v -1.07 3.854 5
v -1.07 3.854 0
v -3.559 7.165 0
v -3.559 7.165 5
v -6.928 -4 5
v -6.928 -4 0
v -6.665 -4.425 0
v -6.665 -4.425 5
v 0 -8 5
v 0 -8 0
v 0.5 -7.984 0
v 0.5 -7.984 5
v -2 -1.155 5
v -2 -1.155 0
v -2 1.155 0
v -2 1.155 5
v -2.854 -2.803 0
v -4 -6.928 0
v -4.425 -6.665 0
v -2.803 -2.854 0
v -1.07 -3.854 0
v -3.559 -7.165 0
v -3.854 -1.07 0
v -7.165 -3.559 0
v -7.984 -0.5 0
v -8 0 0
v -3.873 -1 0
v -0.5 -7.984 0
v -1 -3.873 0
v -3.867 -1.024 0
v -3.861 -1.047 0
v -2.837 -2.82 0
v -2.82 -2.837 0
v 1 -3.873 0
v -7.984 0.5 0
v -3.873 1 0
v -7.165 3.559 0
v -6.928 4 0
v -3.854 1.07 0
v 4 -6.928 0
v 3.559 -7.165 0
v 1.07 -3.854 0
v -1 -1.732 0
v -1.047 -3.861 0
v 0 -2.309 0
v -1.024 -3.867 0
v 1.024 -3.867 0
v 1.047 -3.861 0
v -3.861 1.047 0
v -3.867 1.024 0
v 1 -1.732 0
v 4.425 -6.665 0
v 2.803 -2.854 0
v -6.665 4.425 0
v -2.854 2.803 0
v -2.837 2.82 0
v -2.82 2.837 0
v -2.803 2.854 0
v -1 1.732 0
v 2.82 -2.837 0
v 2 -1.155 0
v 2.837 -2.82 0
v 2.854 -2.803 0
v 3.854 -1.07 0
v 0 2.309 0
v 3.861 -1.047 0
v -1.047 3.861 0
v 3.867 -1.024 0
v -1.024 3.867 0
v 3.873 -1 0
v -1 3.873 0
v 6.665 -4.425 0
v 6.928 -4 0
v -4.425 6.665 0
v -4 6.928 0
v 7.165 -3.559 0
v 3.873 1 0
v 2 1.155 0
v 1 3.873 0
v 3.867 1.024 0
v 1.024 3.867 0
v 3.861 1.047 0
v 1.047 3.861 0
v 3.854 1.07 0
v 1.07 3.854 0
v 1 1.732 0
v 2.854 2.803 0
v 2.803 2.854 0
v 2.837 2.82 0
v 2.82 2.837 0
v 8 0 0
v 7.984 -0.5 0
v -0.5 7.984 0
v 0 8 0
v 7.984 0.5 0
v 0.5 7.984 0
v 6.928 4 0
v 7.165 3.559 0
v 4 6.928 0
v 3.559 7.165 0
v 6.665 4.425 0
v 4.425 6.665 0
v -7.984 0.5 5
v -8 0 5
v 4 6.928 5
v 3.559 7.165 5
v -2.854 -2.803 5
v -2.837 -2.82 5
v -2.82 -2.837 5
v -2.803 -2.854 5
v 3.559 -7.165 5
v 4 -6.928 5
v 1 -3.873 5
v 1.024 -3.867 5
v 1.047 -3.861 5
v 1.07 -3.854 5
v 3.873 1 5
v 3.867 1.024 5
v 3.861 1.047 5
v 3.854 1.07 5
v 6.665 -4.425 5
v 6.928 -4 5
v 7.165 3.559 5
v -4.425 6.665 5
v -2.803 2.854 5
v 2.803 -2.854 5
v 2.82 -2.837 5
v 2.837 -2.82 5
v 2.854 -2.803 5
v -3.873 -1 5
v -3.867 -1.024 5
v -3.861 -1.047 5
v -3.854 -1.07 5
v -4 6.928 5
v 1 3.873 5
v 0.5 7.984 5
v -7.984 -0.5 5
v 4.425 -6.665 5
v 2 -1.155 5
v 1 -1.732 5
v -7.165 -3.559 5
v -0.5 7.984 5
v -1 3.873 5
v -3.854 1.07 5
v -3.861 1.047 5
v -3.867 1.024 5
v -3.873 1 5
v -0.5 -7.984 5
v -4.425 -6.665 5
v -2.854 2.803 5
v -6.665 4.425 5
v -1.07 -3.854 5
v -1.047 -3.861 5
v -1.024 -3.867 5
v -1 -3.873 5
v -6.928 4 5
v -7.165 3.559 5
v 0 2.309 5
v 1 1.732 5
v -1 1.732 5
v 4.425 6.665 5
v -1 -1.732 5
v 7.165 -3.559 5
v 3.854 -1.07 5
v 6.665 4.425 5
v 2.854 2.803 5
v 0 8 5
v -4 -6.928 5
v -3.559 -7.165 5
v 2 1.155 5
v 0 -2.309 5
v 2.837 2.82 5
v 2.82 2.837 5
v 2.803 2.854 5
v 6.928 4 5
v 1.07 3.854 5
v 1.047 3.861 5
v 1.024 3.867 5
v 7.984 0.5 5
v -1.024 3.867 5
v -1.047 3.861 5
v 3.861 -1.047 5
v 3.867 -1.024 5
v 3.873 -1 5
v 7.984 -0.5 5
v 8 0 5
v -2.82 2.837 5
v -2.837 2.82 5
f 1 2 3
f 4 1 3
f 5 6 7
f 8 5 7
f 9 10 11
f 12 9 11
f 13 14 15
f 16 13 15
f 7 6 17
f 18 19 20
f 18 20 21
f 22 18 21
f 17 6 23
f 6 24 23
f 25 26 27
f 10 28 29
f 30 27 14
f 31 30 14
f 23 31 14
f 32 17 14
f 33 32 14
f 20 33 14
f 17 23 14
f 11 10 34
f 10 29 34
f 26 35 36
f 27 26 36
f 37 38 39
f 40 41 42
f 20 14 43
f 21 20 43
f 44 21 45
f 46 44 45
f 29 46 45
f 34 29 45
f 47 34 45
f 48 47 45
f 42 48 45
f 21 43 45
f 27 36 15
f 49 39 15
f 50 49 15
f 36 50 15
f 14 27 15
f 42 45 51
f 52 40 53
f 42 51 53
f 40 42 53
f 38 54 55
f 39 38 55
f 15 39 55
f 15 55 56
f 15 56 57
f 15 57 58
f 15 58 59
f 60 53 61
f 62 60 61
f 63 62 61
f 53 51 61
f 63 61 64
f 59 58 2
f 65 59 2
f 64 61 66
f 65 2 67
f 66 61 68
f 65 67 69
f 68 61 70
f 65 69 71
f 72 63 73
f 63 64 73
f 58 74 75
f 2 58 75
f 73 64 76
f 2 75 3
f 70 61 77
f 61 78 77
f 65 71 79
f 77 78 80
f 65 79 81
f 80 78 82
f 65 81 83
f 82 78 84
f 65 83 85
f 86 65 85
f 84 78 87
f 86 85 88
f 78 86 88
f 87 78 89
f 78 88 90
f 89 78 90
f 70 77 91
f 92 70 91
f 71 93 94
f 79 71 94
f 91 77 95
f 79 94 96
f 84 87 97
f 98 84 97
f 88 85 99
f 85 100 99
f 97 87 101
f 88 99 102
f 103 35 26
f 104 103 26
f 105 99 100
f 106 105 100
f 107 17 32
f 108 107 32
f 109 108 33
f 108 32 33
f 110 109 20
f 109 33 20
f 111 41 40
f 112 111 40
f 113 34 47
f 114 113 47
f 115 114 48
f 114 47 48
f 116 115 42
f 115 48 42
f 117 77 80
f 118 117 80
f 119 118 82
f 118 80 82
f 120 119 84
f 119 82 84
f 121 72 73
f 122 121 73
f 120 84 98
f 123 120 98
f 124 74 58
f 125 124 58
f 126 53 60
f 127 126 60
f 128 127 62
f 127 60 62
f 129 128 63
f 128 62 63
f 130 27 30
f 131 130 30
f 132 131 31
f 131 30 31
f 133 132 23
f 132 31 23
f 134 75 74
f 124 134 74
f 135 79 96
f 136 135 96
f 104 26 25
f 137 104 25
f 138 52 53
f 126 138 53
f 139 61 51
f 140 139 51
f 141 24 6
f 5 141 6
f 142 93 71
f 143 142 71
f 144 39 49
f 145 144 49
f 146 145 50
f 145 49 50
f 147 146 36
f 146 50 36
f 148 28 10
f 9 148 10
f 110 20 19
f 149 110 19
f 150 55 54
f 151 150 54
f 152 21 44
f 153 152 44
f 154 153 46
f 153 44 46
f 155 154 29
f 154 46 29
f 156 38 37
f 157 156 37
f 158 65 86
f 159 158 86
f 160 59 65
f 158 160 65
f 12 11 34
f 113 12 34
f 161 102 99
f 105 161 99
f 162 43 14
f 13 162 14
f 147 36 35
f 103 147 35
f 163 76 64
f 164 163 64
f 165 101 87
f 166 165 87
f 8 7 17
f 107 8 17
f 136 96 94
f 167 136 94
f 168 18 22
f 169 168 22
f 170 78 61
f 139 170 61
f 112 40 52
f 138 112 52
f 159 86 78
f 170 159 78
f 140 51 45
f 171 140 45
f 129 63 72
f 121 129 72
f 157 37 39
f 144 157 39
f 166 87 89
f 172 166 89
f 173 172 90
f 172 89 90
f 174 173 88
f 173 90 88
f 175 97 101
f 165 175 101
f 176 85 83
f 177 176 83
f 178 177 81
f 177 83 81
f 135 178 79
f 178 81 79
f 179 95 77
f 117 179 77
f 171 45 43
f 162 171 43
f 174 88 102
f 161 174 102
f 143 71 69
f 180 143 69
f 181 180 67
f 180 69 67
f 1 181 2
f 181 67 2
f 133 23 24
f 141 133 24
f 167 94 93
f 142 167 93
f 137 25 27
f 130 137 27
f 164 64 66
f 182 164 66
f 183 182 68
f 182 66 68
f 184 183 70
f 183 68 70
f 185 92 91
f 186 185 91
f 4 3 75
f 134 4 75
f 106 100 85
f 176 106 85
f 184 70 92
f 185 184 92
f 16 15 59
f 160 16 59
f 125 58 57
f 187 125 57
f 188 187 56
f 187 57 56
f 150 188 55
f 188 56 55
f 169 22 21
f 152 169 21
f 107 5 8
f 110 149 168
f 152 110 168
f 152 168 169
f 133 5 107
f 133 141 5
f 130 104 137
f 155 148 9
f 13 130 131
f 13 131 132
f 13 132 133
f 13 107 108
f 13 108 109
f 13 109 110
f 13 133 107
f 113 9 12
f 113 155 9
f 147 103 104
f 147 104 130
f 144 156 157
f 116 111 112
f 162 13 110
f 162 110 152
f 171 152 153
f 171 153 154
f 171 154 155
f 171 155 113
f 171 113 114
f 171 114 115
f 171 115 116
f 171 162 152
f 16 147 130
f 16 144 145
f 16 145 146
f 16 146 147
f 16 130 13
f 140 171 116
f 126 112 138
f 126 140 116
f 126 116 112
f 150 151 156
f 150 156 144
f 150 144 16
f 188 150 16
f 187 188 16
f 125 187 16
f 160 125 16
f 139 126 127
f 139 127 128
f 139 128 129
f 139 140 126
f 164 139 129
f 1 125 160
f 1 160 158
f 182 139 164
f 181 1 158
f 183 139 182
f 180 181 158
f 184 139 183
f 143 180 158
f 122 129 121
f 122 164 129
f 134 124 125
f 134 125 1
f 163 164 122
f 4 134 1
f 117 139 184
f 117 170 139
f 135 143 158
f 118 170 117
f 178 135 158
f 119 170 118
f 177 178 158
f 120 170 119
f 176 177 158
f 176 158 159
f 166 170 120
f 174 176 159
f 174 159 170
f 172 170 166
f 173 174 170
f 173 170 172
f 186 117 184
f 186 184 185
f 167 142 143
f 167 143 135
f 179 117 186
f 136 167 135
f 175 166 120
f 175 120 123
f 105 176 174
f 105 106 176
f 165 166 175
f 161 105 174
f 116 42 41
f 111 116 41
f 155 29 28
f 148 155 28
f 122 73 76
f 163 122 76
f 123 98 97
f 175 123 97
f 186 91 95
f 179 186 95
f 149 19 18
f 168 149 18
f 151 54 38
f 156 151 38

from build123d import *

# Parameters (mm, degrees)
F1_DEPTH = 5


# Not quite as in the source:
# - a feature names something its author has since deleted; it is built from what else it names


with BuildPart() as f1:
    # F0 (on Top) → F1 (new body)
    with BuildSketch(Plane.XY):
        with BuildLine():
            ThreePointArc((-1, 3.8729833462), (0, 4), (1, 3.8729833462))
            Line((1, 3.8729833462), (0.4997557997, 7.984375))
            Line((0.4997557997, 7.984375), (0, 8))
            Line((0, 8), (-0.4997557997, 7.984375))
            Line((-0.4997557997, 7.984375), (-1, 3.8729833462))
        make_face()
        with BuildLine():
            ThreePointArc((4, 0), (3.9681187851, 0.5040171699), (3.8729833462, 1))
            ThreePointArc((3.8729833462, 1), (3.8637033052, 1.0352761804), (3.8541019662, 1.0704662693))
            ThreePointArc((3.8541019662, 1.0704662693), (3.4641016151, 2), (2.8541019662, 2.8025170769))
            ThreePointArc((2.8541019662, 2.8025170769), (2.8284271247, 2.8284271247), (2.8025170769, 2.8541019662))
            ThreePointArc((2.8025170769, 2.8541019662), (2, 3.4641016151), (1.0704662693, 3.8541019662))
            ThreePointArc((1.0704662693, 3.8541019662), (1.0352761804, 3.8637033052), (1, 3.8729833462))
            ThreePointArc((1, 3.8729833462), (0, 4), (-1, 3.8729833462))
            ThreePointArc((-1, 3.8729833462), (-1.0352761804, 3.8637033052), (-1.0704662693, 3.8541019662))
            ThreePointArc((-1.0704662693, 3.8541019662), (-2, 3.4641016151), (-2.8025170769, 2.8541019662))
            ThreePointArc((-2.8025170769, 2.8541019662), (-2.8284271247, 2.8284271247), (-2.8541019662, 2.8025170769))
            ThreePointArc((-2.8541019662, 2.8025170769), (-3.4641016151, 2), (-3.8541019662, 1.0704662693))
            ThreePointArc((-3.8541019662, 1.0704662693), (-3.8637033052, 1.0352761804), (-3.8729833462, 1))
            ThreePointArc((-3.8729833462, 1), (-4, 0), (-3.8729833462, -1))
            ThreePointArc((-3.8729833462, -1), (-3.8637033052, -1.0352761804), (-3.8541019662, -1.0704662693))
            ThreePointArc((-3.8541019662, -1.0704662693), (-3.4641016151, -2), (-2.8541019662, -2.8025170769))
            ThreePointArc((-2.8541019662, -2.8025170769), (-2.8284271247, -2.8284271247), (-2.8025170769, -2.8541019662))
            ThreePointArc((-2.8025170769, -2.8541019662), (-2, -3.4641016151), (-1.0704662693, -3.8541019662))
            ThreePointArc((-1.0704662693, -3.8541019662), (-1.0352761804, -3.8637033052), (-1, -3.8729833462))
            ThreePointArc((-1, -3.8729833462), (0, -4), (1, -3.8729833462))
            ThreePointArc((1, -3.8729833462), (1.0352761804, -3.8637033052), (1.0704662693, -3.8541019662))
            ThreePointArc((1.0704662693, -3.8541019662), (2, -3.4641016151), (2.8025170769, -2.8541019662))
            ThreePointArc((2.8025170769, -2.8541019662), (2.8284271247, -2.8284271247), (2.8541019662, -2.8025170769))
            ThreePointArc((2.8541019662, -2.8025170769), (3.4641016151, -2), (3.8541019662, -1.0704662693))
            ThreePointArc((3.8541019662, -1.0704662693), (3.8637033052, -1.0352761804), (3.8729833462, -1))
            ThreePointArc((3.8729833462, -1), (3.9681187851, -0.5040171699), (4, 0))
        make_face()
        Polygon((2, 1.1547005384), (2, 0), (2, -1.1547005384), (1.0000000433, -1.7320507826), (0, -2.3094010768), (-1.0000000161, -1.7320507983), (-2, -1.1547005384), (-2, 0), (-2, 1.1547005384), (-1.0000000433, 1.7320507826), (0, 2.3094010768), (0.9999999889, 1.732050814), align=None, mode=Mode.SUBTRACT)
        with BuildLine():
            Line((2.8025170769, 2.8541019662), (4.4249887183, 6.6647936835))
            Line((4.4249887183, 6.6647936835), (4, 6.9282032303))
            Line((4, 6.9282032303), (3.5593862817, 7.1645494832))
            Line((3.5593862817, 7.1645494832), (1.0704662693, 3.8541019662))
            ThreePointArc((1.0704662693, 3.8541019662), (2, 3.4641016151), (2.8025170769, 2.8541019662))
        make_face()
        with BuildLine():
            Line((3.8541019662, 1.0704662693), (7.1645494832, 3.5593862817))
            Line((7.1645494832, 3.5593862817), (6.9282032303, 4))
            Line((6.9282032303, 4), (6.6647936835, 4.4249887183))
            Line((6.6647936835, 4.4249887183), (2.8541019662, 2.8025170769))
            ThreePointArc((2.8541019662, 2.8025170769), (3.4641016151, 2), (3.8541019662, 1.0704662693))
        make_face()
        with BuildLine():
            Line((7.984375, -0.4997557997), (8, 0))
            Line((8, 0), (7.984375, 0.4997557997))
            Line((7.984375, 0.4997557997), (3.8729833462, 1))
            ThreePointArc((3.8729833462, 1), (3.9681187851, 0.5040171699), (4, 0))
            ThreePointArc((4, 0), (3.9681187851, -0.5040171699), (3.8729833462, -1))
            Line((3.8729833462, -1), (7.984375, -0.4997557997))
        make_face()
        with BuildLine():
            Line((6.9282032303, -4), (7.1645494832, -3.5593862817))
            Line((7.1645494832, -3.5593862817), (3.8541019662, -1.0704662693))
            ThreePointArc((3.8541019662, -1.0704662693), (3.4641016151, -2), (2.8541019662, -2.8025170769))
            Line((2.8541019662, -2.8025170769), (6.6647936835, -4.4249887183))
            Line((6.6647936835, -4.4249887183), (6.9282032303, -4))
        make_face()
        with BuildLine():
            Line((4, -6.9282032303), (4.4249887183, -6.6647936835))
            Line((4.4249887183, -6.6647936835), (2.8025170769, -2.8541019662))
            ThreePointArc((2.8025170769, -2.8541019662), (2, -3.4641016151), (1.0704662693, -3.8541019662))
            Line((1.0704662693, -3.8541019662), (3.5593862817, -7.1645494832))
            Line((3.5593862817, -7.1645494832), (4, -6.9282032303))
        make_face()
        with BuildLine():
            Line((0.4997557997, -7.984375), (1, -3.8729833462))
            ThreePointArc((1, -3.8729833462), (0, -4), (-1, -3.8729833462))
            Line((-1, -3.8729833462), (-0.4997557997, -7.984375))
            Line((-0.4997557997, -7.984375), (0, -8))
            Line((0, -8), (0.4997557997, -7.984375))
        make_face()
        with BuildLine():
            Line((-3.5593862817, -7.1645494832), (-1.0704662693, -3.8541019662))
            ThreePointArc((-1.0704662693, -3.8541019662), (-2, -3.4641016151), (-2.8025170769, -2.8541019662))
            Line((-2.8025170769, -2.8541019662), (-4.4249887183, -6.6647936835))
            Line((-4.4249887183, -6.6647936835), (-4, -6.9282032303))
            Line((-4, -6.9282032303), (-3.5593862817, -7.1645494832))
        make_face()
        with BuildLine():
            Line((-6.6647936835, -4.4249887183), (-2.8541019662, -2.8025170769))
            ThreePointArc((-2.8541019662, -2.8025170769), (-3.4641016151, -2), (-3.8541019662, -1.0704662693))
            Line((-3.8541019662, -1.0704662693), (-7.1645494832, -3.5593862817))
            Line((-7.1645494832, -3.5593862817), (-6.9282032303, -4))
            Line((-6.9282032303, -4), (-6.6647936835, -4.4249887183))
        make_face()
        with BuildLine():
            ThreePointArc((-3.8729833462, -1), (-4, 0), (-3.8729833462, 1))
            Line((-3.8729833462, 1), (-7.984375, 0.4997557997))
            Line((-7.984375, 0.4997557997), (-8, 0))
            Line((-8, 0), (-7.984375, -0.4997557997))
            Line((-7.984375, -0.4997557997), (-3.8729833462, -1))
        make_face()
        with BuildLine():
            ThreePointArc((-3.8541019662, 1.0704662693), (-3.4641016151, 2), (-2.8541019662, 2.8025170769))
            Line((-2.8541019662, 2.8025170769), (-6.6647936835, 4.4249887183))
            Line((-6.6647936835, 4.4249887183), (-6.9282032303, 4))
            Line((-6.9282032303, 4), (-7.1645494832, 3.5593862817))
            Line((-7.1645494832, 3.5593862817), (-3.8541019662, 1.0704662693))
        make_face()
        with BuildLine():
            ThreePointArc((-2.8025170769, 2.8541019662), (-2, 3.4641016151), (-1.0704662693, 3.8541019662))
            Line((-1.0704662693, 3.8541019662), (-3.5593862817, 7.1645494832))
            Line((-3.5593862817, 7.1645494832), (-4, 6.9282032303))
            Line((-4, 6.9282032303), (-4.4249887183, 6.6647936835))
            Line((-4.4249887183, 6.6647936835), (-2.8025170769, 2.8541019662))
        make_face()
    extrude(amount=F1_DEPTH)


solid = f1.part
